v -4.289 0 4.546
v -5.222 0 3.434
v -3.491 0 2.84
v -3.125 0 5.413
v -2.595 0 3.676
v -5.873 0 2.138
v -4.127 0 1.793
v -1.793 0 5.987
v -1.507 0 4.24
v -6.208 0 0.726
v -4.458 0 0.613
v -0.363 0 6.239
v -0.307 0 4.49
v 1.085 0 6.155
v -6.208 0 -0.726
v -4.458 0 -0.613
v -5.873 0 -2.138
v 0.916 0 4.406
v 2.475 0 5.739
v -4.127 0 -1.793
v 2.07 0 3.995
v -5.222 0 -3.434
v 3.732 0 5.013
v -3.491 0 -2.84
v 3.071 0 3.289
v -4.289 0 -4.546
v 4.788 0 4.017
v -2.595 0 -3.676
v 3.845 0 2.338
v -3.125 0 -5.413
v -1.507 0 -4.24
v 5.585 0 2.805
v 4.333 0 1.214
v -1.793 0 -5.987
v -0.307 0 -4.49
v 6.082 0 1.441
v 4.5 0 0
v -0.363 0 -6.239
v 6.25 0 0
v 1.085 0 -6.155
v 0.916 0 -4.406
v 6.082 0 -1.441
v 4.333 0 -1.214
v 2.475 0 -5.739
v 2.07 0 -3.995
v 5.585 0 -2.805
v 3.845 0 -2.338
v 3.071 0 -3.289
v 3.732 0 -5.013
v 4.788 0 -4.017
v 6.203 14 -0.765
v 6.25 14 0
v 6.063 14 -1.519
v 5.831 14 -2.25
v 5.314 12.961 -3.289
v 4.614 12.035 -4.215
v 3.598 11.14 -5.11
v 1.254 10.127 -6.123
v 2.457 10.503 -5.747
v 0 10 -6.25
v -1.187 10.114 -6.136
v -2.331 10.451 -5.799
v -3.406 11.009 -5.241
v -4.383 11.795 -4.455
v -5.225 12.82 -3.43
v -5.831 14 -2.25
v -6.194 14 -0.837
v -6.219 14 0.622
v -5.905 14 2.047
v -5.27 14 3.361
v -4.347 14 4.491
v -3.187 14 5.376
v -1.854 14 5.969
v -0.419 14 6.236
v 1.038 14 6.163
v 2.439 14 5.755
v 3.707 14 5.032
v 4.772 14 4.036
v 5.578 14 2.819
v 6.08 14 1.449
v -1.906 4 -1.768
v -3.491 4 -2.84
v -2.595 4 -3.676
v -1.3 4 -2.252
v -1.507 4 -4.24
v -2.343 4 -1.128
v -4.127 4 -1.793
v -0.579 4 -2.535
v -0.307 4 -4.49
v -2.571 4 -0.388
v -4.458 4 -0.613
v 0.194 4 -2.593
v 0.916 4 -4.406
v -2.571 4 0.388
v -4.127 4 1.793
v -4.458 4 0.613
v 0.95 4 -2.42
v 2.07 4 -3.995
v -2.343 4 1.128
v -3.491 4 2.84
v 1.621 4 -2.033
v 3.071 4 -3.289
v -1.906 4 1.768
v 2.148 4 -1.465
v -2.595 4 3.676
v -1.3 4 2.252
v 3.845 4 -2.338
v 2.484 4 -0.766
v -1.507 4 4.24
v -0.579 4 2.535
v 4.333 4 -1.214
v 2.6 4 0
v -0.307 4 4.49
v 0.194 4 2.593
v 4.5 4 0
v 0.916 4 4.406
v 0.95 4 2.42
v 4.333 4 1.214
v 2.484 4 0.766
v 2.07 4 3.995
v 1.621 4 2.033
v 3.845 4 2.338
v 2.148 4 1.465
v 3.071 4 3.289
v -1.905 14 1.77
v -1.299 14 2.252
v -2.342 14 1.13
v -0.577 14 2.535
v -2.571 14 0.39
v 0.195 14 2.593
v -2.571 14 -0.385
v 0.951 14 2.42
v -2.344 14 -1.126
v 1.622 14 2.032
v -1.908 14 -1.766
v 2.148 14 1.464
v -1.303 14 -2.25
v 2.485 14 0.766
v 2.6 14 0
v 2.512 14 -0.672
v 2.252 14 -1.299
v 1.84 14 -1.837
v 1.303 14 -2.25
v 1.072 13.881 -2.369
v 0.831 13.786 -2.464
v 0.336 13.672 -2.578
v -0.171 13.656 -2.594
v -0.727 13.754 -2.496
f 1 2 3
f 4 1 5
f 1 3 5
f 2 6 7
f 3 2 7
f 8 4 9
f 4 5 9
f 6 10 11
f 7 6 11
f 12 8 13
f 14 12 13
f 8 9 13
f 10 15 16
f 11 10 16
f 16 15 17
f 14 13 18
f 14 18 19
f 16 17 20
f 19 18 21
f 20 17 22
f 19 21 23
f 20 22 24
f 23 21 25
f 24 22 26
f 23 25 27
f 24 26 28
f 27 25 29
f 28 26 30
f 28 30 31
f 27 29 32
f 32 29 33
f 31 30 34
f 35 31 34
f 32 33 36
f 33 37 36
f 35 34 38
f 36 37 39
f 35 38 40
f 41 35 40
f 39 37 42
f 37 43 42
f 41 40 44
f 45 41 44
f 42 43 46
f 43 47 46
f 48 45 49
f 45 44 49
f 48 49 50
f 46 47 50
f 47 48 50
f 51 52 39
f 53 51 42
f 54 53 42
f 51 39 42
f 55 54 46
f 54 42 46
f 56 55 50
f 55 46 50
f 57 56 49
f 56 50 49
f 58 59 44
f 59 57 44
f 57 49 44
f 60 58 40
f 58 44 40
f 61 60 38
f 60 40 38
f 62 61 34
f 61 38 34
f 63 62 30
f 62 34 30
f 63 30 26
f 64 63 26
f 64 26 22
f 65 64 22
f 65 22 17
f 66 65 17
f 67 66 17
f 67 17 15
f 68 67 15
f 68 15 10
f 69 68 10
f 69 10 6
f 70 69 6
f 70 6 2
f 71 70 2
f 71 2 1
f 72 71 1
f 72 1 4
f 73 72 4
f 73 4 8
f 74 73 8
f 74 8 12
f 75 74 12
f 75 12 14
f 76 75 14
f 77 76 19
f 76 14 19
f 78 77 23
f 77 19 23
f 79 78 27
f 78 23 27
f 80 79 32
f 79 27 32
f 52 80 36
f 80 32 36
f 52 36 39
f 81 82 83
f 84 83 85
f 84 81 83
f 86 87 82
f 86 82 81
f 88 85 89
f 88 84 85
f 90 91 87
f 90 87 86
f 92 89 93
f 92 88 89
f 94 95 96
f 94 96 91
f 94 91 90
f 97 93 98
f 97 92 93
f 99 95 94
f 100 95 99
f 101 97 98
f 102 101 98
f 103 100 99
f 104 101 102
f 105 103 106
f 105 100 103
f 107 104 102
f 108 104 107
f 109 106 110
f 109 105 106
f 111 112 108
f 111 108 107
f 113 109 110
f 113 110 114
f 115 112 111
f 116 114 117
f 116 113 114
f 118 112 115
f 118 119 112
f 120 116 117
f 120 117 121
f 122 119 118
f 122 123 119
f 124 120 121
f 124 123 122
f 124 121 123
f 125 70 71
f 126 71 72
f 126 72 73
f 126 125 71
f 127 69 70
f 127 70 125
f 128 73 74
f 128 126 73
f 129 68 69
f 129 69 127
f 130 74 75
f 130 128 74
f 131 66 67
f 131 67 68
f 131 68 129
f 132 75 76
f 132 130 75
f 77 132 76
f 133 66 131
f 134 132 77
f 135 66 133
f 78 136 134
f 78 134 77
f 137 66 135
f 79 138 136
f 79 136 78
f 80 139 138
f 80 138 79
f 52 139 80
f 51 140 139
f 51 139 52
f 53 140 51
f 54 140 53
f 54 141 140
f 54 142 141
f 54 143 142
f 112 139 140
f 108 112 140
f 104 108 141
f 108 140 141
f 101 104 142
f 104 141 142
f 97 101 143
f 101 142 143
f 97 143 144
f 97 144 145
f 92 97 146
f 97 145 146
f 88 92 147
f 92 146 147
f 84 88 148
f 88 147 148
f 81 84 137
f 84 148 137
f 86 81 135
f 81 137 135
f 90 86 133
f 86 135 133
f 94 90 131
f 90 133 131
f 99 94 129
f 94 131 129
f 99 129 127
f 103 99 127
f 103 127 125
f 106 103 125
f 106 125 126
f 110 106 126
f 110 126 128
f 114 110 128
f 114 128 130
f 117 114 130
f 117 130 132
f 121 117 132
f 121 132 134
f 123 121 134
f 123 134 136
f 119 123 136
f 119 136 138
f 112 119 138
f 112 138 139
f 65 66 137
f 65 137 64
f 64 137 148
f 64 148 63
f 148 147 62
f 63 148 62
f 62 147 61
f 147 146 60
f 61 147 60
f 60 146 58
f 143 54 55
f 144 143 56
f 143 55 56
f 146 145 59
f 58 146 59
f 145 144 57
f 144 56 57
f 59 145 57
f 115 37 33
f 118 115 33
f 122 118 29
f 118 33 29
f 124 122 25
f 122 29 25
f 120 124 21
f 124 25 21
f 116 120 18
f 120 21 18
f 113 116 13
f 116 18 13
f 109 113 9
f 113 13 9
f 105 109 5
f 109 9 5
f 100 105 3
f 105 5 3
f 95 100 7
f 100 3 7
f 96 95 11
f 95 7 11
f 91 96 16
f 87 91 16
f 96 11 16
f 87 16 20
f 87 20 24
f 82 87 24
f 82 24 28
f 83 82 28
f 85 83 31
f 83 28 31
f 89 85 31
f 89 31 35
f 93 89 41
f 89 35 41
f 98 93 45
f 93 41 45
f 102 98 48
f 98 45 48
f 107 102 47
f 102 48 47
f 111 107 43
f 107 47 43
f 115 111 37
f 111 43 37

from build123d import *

# Parameters (mm, degrees)
SKETCH1_R           = 6.25
BOSS_EXTRUDE1_DEPTH = 14
SKETCH2_R           = 2.6
CUT_EXTRUDE1_DEPTH  = 14
CUT_EXTRUDE2_DEPTH  = 7
SKETCH4_R           = 4.5
CUT_EXTRUDE3_DEPTH  = 4


with BuildPart() as part:
    # Sketch1 → Boss-Extrude1 (new body)
    with BuildSketch(Plane(origin=(0, 0, 0), x_dir=(1, 0, 0), z_dir=(0, 1, 0))):
        Circle(SKETCH1_R)
    extrude(amount=BOSS_EXTRUDE1_DEPTH)

    # Sketch2 → Cut-Extrude1 (cut)
    with BuildSketch(Plane(origin=(0, 14, 0), x_dir=(1, 0, 0), z_dir=(0, 1, 0))):
        Circle(SKETCH2_R)
    extrude(amount=-CUT_EXTRUDE1_DEPTH, mode=Mode.SUBTRACT)

    # Sketch3 → Cut-Extrude2 (cut, symmetric)
    with BuildSketch(Plane(origin=(0, 0, 0), x_dir=(0, 0, -1), z_dir=(1, 0, 0))):
        Polygon((2.25, 14), (6.25, 10), (6.25, 14), align=None)
    extrude(amount=CUT_EXTRUDE2_DEPTH, both=True, mode=Mode.SUBTRACT)

    # Sketch4 → Cut-Extrude3 (cut)
    with BuildSketch(Plane.XZ):
        Circle(SKETCH4_R)
    extrude(amount=-CUT_EXTRUDE3_DEPTH, mode=Mode.SUBTRACT)


solid = part.part
